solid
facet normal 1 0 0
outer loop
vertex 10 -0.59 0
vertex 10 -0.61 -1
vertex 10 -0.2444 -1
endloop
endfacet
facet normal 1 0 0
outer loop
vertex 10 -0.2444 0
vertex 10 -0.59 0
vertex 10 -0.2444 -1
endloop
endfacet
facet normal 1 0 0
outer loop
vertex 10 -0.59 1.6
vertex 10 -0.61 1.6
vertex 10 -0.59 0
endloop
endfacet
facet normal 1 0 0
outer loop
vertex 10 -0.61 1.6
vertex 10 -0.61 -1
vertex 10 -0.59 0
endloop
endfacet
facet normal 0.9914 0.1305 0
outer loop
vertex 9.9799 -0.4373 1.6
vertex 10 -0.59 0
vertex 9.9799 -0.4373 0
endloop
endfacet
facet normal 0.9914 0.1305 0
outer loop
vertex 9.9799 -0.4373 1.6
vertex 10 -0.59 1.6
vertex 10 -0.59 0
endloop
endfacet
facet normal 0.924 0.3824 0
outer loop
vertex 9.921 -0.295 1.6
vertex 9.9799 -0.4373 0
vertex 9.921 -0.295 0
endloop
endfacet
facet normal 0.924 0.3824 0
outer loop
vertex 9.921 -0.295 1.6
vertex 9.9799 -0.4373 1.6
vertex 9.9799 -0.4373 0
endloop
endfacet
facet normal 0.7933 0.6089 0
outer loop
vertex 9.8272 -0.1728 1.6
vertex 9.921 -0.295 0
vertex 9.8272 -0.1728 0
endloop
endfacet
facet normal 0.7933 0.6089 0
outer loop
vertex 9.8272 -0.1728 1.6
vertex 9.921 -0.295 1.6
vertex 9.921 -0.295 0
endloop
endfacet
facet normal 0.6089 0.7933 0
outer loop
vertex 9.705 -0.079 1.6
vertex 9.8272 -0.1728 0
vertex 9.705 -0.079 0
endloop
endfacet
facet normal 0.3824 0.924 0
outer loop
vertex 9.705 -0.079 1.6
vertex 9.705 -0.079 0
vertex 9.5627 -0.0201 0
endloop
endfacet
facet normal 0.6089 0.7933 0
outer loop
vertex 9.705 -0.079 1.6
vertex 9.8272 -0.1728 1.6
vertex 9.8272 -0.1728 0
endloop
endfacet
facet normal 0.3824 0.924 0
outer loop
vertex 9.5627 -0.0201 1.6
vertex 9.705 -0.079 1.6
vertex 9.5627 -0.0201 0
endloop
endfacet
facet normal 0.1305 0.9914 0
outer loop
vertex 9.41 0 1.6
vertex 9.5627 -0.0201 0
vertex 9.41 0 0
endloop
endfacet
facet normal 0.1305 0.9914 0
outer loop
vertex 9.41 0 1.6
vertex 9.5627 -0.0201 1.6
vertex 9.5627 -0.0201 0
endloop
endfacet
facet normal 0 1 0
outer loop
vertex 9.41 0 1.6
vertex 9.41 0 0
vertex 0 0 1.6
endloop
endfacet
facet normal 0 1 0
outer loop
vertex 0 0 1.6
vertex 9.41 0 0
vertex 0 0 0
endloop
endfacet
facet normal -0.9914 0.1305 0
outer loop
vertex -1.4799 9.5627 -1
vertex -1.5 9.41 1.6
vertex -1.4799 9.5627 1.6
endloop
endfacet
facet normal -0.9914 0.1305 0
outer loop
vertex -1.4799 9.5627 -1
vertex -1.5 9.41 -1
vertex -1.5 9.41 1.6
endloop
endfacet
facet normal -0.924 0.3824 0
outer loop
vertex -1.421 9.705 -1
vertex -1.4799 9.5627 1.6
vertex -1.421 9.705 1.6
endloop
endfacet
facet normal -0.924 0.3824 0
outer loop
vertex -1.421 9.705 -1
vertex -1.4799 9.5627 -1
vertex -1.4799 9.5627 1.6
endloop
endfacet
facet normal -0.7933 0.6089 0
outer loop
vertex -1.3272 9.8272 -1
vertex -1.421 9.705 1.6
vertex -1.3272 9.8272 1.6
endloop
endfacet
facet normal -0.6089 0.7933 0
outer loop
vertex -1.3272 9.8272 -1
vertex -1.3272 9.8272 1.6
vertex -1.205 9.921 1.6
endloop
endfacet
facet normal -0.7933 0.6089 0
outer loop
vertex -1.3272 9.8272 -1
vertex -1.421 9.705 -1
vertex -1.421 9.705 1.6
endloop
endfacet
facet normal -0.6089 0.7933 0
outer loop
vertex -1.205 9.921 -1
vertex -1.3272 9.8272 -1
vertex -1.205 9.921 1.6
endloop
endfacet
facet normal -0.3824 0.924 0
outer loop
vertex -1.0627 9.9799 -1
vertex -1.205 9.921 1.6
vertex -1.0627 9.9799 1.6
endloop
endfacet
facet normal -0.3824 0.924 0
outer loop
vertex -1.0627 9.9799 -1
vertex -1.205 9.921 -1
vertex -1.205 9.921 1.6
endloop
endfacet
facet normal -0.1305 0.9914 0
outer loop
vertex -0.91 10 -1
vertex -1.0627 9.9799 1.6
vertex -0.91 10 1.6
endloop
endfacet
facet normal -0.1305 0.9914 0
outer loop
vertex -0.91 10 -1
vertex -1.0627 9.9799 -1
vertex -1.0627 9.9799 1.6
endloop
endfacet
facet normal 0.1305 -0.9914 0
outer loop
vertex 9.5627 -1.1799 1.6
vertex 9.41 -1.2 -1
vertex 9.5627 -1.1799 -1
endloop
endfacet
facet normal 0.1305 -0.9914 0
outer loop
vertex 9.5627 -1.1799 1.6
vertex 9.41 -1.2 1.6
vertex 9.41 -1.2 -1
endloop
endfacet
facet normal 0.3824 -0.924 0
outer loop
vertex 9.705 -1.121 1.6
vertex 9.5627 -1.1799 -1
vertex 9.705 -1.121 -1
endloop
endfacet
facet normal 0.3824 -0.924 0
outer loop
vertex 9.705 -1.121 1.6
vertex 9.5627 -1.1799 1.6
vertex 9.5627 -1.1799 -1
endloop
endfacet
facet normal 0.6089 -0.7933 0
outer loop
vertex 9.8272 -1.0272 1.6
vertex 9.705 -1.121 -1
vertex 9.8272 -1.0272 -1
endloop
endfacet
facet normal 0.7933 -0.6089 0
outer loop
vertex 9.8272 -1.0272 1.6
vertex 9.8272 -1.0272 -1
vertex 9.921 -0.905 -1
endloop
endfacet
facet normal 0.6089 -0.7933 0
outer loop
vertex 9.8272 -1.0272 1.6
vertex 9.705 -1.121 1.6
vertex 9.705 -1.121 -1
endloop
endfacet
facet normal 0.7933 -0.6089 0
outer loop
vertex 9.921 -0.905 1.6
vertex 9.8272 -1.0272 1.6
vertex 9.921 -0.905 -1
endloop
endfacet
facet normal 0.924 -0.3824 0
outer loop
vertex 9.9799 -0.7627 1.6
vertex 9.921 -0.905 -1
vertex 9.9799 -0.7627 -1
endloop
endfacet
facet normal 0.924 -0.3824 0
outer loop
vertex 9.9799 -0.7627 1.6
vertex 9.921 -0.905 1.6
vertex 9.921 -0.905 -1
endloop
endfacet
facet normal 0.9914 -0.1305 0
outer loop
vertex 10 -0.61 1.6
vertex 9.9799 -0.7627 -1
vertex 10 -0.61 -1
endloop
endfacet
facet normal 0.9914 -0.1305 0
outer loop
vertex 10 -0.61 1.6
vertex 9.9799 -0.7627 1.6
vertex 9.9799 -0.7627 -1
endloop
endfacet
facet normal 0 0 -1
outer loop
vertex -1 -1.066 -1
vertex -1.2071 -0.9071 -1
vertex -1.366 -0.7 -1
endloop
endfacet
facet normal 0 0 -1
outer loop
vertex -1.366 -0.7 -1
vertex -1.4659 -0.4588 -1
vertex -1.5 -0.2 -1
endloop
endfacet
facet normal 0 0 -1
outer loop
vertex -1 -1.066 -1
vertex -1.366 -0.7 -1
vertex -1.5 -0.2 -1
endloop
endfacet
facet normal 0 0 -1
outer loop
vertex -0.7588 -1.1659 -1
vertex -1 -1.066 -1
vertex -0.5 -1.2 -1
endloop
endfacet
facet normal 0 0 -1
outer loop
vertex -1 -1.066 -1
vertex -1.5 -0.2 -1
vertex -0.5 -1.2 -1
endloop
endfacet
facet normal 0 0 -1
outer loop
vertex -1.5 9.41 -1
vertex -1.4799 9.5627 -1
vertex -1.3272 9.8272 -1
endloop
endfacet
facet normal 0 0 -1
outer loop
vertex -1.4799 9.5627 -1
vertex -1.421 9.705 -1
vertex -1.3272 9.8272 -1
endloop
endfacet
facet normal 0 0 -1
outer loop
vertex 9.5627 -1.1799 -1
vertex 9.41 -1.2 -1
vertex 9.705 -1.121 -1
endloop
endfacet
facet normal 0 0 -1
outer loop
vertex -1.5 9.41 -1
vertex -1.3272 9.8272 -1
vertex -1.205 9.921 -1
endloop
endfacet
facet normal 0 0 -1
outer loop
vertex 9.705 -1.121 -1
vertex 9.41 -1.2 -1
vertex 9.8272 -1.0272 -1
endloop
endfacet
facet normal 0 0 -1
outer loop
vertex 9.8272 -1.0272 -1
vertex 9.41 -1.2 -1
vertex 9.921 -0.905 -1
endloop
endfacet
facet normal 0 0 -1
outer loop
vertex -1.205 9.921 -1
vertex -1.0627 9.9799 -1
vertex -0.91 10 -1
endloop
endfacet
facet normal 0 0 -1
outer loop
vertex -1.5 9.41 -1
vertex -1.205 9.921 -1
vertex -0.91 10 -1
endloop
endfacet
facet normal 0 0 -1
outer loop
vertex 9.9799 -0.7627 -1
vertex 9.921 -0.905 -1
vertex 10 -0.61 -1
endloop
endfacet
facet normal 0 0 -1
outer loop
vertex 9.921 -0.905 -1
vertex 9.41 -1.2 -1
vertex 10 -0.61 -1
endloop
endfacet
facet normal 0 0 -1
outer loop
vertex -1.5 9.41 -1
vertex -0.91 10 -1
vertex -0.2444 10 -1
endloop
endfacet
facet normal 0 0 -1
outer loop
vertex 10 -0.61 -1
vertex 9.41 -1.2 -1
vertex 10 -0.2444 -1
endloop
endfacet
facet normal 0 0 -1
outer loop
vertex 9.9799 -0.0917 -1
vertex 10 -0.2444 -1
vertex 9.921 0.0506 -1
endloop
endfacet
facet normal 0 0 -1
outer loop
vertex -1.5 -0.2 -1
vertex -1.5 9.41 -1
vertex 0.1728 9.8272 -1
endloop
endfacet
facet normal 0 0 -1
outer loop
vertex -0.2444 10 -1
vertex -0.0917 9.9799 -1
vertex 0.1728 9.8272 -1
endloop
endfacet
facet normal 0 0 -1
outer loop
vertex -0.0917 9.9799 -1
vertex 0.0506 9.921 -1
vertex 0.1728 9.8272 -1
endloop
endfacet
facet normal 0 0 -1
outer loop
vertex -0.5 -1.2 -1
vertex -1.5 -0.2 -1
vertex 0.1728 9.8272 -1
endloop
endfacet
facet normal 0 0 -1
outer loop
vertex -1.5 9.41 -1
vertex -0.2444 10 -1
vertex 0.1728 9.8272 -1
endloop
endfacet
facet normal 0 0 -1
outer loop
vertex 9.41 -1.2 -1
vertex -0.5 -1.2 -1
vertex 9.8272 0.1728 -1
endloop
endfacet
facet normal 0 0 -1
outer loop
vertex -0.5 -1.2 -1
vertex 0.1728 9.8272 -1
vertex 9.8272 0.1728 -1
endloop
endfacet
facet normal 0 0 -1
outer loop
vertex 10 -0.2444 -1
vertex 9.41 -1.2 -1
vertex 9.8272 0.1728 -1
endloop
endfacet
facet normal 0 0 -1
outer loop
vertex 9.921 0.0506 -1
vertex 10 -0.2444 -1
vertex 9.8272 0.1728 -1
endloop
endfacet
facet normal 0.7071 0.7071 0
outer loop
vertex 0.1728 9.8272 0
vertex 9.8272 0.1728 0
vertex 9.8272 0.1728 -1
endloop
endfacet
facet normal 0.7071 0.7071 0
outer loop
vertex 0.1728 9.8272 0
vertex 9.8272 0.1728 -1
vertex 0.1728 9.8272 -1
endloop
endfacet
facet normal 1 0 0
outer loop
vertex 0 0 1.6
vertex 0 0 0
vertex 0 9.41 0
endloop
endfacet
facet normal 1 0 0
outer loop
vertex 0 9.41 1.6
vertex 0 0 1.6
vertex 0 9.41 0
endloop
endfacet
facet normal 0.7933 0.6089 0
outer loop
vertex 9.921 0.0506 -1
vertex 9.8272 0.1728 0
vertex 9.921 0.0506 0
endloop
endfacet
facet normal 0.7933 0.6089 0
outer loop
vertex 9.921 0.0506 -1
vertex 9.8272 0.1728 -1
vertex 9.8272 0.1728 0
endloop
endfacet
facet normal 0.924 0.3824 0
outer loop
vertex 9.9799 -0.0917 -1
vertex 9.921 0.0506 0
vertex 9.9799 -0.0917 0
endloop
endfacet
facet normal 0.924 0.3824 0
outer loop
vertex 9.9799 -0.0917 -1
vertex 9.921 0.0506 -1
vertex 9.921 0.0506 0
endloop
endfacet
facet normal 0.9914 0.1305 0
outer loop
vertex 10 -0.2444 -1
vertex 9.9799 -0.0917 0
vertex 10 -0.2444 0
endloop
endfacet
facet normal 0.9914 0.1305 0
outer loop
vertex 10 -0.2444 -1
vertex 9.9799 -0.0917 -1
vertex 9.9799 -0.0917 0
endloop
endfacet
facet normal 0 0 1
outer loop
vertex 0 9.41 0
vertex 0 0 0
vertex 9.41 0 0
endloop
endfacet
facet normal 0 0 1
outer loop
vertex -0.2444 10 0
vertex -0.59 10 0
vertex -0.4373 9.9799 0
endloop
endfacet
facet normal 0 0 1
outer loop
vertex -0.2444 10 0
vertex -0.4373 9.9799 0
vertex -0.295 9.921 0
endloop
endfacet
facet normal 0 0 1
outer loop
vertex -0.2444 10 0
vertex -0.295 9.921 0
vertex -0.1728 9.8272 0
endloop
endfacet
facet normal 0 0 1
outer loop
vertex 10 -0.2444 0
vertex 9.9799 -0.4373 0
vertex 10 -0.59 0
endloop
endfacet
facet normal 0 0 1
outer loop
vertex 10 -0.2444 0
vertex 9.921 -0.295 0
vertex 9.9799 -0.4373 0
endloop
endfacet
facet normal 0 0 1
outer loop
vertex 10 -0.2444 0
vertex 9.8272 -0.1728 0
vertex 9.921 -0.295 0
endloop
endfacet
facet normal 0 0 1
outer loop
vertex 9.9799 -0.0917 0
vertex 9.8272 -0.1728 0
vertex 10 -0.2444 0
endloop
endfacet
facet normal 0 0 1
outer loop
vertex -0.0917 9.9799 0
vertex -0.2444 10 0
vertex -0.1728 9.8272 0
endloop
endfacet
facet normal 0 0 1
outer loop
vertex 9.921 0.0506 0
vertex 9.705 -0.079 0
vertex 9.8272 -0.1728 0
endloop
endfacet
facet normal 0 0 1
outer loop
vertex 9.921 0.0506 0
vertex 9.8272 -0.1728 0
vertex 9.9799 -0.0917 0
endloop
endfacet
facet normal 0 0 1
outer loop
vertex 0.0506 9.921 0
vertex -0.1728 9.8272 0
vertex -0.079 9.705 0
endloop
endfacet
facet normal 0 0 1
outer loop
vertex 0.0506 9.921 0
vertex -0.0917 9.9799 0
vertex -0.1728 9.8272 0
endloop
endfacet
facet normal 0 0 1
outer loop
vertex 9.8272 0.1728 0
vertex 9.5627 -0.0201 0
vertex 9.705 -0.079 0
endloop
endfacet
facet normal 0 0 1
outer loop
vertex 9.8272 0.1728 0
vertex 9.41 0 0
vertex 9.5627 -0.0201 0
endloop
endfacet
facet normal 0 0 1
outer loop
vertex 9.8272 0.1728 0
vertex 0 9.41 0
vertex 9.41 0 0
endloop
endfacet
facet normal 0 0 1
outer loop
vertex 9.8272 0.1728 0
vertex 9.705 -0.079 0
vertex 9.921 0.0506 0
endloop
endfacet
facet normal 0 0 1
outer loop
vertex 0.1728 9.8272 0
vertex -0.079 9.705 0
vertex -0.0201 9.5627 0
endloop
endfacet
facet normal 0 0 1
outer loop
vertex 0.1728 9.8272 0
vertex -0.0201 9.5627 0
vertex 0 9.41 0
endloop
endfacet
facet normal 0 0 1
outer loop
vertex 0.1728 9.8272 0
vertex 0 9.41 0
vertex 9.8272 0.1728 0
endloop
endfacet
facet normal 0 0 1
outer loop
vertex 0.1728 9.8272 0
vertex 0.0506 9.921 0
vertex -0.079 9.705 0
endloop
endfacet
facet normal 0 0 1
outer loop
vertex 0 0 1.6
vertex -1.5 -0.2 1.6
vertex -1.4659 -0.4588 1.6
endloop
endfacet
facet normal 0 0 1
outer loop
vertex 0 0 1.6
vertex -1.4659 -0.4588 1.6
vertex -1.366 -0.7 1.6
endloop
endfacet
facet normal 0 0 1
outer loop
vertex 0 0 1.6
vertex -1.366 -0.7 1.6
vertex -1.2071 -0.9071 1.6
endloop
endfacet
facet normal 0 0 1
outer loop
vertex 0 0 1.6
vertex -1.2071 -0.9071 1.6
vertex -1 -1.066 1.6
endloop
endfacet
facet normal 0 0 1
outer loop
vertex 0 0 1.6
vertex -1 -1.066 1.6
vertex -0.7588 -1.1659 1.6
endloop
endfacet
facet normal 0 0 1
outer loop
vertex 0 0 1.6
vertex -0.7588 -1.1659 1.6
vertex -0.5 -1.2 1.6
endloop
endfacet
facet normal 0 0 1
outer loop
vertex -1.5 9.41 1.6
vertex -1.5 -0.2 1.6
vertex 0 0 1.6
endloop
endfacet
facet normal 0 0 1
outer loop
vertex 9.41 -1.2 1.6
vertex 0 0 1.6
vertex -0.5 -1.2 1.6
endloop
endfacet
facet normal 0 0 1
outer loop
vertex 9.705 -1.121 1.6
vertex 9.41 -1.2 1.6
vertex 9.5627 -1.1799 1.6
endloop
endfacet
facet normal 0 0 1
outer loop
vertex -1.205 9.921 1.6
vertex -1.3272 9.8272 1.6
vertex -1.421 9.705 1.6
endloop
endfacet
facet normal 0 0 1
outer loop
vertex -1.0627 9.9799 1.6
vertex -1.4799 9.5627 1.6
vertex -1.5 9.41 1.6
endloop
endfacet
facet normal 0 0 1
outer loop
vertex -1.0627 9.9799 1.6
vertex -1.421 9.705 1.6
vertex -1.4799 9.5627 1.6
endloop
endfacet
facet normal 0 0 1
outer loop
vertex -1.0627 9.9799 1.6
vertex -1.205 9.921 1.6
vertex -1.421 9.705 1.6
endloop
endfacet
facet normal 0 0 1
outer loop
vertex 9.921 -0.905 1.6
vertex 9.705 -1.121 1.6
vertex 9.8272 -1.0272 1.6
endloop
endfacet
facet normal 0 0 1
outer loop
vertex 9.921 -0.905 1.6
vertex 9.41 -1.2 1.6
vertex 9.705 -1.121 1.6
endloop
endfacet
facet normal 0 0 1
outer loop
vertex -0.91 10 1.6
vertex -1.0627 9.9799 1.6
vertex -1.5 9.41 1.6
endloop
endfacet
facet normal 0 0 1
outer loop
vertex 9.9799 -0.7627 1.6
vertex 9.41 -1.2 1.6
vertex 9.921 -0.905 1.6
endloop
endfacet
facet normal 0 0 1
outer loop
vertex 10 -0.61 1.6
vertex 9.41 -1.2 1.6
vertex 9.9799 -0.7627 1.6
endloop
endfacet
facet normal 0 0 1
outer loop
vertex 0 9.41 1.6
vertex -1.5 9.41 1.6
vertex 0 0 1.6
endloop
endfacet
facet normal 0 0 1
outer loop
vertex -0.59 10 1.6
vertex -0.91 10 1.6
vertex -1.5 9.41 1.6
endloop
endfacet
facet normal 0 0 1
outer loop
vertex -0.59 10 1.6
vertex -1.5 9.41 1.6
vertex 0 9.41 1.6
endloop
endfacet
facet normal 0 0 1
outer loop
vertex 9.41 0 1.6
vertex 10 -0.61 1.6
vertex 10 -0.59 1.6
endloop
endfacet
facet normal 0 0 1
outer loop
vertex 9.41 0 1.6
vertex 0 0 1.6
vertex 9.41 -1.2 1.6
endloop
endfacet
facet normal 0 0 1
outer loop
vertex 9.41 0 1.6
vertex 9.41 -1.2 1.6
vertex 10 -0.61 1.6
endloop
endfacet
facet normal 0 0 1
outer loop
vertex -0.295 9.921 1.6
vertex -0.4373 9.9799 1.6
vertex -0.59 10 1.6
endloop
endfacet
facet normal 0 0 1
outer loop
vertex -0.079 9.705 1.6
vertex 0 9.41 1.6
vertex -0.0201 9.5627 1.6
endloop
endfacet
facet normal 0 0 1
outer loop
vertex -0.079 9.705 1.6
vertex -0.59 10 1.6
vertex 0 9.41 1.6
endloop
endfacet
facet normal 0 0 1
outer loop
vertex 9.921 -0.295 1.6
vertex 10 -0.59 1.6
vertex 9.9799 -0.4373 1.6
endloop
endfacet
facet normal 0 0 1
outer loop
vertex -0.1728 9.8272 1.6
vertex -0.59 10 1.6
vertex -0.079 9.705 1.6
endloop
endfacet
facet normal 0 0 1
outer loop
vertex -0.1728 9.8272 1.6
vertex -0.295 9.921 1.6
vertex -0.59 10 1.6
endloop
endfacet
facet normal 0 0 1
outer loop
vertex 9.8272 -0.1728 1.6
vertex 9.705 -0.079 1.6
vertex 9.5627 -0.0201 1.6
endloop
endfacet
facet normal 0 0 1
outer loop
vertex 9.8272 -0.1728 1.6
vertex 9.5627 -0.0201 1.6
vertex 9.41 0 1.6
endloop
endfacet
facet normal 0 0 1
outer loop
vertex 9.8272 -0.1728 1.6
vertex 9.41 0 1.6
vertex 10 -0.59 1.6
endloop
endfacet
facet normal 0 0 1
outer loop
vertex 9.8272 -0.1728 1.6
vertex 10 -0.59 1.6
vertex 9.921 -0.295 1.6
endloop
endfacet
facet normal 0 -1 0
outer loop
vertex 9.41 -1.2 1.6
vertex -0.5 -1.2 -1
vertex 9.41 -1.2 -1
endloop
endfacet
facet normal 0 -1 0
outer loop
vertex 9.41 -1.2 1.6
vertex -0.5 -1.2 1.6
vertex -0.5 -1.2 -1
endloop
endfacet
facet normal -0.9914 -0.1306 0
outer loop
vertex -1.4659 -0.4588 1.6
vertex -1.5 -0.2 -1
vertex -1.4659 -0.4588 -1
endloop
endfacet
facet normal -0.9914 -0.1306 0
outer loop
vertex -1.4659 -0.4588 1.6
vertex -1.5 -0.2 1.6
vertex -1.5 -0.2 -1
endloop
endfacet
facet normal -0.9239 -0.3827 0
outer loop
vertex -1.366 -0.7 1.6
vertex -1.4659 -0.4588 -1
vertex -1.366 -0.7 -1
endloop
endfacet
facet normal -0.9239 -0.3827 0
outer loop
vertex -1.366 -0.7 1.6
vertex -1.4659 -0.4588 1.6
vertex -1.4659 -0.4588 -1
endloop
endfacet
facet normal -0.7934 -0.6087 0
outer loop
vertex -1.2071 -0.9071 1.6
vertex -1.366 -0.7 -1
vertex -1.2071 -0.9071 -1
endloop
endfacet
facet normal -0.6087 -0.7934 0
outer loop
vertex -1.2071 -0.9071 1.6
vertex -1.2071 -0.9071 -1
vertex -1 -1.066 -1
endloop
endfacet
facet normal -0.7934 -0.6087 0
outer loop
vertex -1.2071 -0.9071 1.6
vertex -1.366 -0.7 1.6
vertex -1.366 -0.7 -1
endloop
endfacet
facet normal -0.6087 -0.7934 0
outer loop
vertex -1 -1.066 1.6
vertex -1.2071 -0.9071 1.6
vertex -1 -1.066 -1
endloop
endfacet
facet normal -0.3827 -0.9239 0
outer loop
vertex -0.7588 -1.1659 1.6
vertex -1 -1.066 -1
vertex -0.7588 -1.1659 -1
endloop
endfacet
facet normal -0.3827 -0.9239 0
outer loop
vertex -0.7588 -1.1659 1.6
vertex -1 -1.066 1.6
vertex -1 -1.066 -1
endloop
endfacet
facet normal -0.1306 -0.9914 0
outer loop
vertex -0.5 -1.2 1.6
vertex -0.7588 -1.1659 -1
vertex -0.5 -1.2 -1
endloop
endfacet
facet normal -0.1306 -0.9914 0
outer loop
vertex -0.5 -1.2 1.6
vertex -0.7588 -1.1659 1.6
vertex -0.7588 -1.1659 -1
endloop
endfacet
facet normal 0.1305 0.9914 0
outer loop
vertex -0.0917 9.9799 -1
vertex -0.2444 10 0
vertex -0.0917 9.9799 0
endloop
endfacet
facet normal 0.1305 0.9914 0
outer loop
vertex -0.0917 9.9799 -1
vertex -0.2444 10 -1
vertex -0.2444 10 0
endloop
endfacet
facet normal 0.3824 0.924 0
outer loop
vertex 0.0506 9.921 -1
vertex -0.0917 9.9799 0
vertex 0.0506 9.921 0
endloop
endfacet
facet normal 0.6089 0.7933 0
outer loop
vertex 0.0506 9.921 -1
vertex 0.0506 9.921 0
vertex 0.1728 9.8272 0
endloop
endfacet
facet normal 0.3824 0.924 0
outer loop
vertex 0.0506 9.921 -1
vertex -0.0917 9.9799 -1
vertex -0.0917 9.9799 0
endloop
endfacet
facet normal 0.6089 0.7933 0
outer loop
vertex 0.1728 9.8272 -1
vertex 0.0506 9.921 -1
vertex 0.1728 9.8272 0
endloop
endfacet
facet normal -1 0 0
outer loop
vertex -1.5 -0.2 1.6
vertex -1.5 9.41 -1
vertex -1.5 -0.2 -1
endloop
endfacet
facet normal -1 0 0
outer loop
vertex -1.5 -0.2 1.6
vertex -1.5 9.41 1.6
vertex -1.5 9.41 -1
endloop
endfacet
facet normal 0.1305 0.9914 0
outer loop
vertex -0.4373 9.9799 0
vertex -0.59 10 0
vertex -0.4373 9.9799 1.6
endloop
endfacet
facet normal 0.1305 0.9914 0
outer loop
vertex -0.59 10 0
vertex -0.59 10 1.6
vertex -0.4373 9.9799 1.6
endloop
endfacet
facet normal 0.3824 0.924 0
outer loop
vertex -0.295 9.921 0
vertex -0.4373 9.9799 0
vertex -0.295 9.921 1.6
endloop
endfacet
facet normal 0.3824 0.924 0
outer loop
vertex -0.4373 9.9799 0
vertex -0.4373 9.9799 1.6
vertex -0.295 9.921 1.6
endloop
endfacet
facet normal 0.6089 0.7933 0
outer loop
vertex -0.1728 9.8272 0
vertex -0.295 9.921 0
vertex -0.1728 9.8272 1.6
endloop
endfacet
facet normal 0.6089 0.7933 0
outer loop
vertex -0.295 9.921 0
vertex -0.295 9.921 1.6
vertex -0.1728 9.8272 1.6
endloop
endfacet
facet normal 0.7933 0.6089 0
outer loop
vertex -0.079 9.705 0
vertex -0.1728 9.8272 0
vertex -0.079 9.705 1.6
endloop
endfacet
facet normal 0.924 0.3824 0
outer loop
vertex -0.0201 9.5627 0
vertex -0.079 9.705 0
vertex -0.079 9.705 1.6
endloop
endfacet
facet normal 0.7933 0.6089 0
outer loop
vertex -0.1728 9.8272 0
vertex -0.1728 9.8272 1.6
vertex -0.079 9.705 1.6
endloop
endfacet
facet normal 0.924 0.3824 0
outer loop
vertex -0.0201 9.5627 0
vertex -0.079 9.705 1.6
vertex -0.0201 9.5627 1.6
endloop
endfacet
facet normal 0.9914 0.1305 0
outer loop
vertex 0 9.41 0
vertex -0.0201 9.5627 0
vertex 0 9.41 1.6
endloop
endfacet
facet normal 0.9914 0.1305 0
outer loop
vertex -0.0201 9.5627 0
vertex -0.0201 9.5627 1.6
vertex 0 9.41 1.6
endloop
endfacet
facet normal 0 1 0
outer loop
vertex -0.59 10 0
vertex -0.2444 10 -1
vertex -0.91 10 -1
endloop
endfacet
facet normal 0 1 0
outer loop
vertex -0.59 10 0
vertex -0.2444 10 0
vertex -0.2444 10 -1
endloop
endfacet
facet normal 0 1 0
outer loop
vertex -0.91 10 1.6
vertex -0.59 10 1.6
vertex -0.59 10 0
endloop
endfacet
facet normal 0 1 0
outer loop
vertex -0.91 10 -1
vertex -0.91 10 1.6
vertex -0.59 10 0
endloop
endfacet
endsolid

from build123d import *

# Parameters (mm, degrees)
PAD_DEPTH    = 1.6
PAD001_DEPTH = 1
FILLET_R     = 1
FILLET002_R  = 0.59
FILLET003_R  = 0.59


with BuildPart() as part:
    # Sketch → Pad (new body)
    with BuildSketch(Plane.XY):
        Polygon((0, 10), (-1.5, 10), (-1.5, -1.2), (10, -1.2), (10, 0), (0, 0), align=None)
    extrude(amount=PAD_DEPTH)

    # Sketch001 → Pad001 (join)
    with BuildSketch(Plane.XY):
        Polygon((-1.5, 10), (-1.5, -1.2), (10, -1.2), (10, 0), (0, 10), align=None)
    extrude(amount=-PAD001_DEPTH)

    # Fillet
    fillet_edges = [part.edges().sort_by_distance(p)[0] for p in [
        (-1.5, -1.2, 0.3),
    ]]
    fillet(fillet_edges, radius=FILLET_R)

    # Fillet002
    fillet002_edges = [part.edges().sort_by_distance(p)[0] for p in [
        (0, 10, 0.8),
        (10, -1.2, 0.3),
        (10, 0, 0.8),
        (-1.5, 10, 0.3),
    ]]
    fillet(fillet002_edges, radius=FILLET002_R)

    # Fillet003
    fillet003_edges = [part.edges().sort_by_distance(p)[0] for p in [
        (10, 0, -0.5),
        (0, 10, -0.5),
    ]]
    fillet(fillet003_edges, radius=FILLET003_R)


solid = part.part
